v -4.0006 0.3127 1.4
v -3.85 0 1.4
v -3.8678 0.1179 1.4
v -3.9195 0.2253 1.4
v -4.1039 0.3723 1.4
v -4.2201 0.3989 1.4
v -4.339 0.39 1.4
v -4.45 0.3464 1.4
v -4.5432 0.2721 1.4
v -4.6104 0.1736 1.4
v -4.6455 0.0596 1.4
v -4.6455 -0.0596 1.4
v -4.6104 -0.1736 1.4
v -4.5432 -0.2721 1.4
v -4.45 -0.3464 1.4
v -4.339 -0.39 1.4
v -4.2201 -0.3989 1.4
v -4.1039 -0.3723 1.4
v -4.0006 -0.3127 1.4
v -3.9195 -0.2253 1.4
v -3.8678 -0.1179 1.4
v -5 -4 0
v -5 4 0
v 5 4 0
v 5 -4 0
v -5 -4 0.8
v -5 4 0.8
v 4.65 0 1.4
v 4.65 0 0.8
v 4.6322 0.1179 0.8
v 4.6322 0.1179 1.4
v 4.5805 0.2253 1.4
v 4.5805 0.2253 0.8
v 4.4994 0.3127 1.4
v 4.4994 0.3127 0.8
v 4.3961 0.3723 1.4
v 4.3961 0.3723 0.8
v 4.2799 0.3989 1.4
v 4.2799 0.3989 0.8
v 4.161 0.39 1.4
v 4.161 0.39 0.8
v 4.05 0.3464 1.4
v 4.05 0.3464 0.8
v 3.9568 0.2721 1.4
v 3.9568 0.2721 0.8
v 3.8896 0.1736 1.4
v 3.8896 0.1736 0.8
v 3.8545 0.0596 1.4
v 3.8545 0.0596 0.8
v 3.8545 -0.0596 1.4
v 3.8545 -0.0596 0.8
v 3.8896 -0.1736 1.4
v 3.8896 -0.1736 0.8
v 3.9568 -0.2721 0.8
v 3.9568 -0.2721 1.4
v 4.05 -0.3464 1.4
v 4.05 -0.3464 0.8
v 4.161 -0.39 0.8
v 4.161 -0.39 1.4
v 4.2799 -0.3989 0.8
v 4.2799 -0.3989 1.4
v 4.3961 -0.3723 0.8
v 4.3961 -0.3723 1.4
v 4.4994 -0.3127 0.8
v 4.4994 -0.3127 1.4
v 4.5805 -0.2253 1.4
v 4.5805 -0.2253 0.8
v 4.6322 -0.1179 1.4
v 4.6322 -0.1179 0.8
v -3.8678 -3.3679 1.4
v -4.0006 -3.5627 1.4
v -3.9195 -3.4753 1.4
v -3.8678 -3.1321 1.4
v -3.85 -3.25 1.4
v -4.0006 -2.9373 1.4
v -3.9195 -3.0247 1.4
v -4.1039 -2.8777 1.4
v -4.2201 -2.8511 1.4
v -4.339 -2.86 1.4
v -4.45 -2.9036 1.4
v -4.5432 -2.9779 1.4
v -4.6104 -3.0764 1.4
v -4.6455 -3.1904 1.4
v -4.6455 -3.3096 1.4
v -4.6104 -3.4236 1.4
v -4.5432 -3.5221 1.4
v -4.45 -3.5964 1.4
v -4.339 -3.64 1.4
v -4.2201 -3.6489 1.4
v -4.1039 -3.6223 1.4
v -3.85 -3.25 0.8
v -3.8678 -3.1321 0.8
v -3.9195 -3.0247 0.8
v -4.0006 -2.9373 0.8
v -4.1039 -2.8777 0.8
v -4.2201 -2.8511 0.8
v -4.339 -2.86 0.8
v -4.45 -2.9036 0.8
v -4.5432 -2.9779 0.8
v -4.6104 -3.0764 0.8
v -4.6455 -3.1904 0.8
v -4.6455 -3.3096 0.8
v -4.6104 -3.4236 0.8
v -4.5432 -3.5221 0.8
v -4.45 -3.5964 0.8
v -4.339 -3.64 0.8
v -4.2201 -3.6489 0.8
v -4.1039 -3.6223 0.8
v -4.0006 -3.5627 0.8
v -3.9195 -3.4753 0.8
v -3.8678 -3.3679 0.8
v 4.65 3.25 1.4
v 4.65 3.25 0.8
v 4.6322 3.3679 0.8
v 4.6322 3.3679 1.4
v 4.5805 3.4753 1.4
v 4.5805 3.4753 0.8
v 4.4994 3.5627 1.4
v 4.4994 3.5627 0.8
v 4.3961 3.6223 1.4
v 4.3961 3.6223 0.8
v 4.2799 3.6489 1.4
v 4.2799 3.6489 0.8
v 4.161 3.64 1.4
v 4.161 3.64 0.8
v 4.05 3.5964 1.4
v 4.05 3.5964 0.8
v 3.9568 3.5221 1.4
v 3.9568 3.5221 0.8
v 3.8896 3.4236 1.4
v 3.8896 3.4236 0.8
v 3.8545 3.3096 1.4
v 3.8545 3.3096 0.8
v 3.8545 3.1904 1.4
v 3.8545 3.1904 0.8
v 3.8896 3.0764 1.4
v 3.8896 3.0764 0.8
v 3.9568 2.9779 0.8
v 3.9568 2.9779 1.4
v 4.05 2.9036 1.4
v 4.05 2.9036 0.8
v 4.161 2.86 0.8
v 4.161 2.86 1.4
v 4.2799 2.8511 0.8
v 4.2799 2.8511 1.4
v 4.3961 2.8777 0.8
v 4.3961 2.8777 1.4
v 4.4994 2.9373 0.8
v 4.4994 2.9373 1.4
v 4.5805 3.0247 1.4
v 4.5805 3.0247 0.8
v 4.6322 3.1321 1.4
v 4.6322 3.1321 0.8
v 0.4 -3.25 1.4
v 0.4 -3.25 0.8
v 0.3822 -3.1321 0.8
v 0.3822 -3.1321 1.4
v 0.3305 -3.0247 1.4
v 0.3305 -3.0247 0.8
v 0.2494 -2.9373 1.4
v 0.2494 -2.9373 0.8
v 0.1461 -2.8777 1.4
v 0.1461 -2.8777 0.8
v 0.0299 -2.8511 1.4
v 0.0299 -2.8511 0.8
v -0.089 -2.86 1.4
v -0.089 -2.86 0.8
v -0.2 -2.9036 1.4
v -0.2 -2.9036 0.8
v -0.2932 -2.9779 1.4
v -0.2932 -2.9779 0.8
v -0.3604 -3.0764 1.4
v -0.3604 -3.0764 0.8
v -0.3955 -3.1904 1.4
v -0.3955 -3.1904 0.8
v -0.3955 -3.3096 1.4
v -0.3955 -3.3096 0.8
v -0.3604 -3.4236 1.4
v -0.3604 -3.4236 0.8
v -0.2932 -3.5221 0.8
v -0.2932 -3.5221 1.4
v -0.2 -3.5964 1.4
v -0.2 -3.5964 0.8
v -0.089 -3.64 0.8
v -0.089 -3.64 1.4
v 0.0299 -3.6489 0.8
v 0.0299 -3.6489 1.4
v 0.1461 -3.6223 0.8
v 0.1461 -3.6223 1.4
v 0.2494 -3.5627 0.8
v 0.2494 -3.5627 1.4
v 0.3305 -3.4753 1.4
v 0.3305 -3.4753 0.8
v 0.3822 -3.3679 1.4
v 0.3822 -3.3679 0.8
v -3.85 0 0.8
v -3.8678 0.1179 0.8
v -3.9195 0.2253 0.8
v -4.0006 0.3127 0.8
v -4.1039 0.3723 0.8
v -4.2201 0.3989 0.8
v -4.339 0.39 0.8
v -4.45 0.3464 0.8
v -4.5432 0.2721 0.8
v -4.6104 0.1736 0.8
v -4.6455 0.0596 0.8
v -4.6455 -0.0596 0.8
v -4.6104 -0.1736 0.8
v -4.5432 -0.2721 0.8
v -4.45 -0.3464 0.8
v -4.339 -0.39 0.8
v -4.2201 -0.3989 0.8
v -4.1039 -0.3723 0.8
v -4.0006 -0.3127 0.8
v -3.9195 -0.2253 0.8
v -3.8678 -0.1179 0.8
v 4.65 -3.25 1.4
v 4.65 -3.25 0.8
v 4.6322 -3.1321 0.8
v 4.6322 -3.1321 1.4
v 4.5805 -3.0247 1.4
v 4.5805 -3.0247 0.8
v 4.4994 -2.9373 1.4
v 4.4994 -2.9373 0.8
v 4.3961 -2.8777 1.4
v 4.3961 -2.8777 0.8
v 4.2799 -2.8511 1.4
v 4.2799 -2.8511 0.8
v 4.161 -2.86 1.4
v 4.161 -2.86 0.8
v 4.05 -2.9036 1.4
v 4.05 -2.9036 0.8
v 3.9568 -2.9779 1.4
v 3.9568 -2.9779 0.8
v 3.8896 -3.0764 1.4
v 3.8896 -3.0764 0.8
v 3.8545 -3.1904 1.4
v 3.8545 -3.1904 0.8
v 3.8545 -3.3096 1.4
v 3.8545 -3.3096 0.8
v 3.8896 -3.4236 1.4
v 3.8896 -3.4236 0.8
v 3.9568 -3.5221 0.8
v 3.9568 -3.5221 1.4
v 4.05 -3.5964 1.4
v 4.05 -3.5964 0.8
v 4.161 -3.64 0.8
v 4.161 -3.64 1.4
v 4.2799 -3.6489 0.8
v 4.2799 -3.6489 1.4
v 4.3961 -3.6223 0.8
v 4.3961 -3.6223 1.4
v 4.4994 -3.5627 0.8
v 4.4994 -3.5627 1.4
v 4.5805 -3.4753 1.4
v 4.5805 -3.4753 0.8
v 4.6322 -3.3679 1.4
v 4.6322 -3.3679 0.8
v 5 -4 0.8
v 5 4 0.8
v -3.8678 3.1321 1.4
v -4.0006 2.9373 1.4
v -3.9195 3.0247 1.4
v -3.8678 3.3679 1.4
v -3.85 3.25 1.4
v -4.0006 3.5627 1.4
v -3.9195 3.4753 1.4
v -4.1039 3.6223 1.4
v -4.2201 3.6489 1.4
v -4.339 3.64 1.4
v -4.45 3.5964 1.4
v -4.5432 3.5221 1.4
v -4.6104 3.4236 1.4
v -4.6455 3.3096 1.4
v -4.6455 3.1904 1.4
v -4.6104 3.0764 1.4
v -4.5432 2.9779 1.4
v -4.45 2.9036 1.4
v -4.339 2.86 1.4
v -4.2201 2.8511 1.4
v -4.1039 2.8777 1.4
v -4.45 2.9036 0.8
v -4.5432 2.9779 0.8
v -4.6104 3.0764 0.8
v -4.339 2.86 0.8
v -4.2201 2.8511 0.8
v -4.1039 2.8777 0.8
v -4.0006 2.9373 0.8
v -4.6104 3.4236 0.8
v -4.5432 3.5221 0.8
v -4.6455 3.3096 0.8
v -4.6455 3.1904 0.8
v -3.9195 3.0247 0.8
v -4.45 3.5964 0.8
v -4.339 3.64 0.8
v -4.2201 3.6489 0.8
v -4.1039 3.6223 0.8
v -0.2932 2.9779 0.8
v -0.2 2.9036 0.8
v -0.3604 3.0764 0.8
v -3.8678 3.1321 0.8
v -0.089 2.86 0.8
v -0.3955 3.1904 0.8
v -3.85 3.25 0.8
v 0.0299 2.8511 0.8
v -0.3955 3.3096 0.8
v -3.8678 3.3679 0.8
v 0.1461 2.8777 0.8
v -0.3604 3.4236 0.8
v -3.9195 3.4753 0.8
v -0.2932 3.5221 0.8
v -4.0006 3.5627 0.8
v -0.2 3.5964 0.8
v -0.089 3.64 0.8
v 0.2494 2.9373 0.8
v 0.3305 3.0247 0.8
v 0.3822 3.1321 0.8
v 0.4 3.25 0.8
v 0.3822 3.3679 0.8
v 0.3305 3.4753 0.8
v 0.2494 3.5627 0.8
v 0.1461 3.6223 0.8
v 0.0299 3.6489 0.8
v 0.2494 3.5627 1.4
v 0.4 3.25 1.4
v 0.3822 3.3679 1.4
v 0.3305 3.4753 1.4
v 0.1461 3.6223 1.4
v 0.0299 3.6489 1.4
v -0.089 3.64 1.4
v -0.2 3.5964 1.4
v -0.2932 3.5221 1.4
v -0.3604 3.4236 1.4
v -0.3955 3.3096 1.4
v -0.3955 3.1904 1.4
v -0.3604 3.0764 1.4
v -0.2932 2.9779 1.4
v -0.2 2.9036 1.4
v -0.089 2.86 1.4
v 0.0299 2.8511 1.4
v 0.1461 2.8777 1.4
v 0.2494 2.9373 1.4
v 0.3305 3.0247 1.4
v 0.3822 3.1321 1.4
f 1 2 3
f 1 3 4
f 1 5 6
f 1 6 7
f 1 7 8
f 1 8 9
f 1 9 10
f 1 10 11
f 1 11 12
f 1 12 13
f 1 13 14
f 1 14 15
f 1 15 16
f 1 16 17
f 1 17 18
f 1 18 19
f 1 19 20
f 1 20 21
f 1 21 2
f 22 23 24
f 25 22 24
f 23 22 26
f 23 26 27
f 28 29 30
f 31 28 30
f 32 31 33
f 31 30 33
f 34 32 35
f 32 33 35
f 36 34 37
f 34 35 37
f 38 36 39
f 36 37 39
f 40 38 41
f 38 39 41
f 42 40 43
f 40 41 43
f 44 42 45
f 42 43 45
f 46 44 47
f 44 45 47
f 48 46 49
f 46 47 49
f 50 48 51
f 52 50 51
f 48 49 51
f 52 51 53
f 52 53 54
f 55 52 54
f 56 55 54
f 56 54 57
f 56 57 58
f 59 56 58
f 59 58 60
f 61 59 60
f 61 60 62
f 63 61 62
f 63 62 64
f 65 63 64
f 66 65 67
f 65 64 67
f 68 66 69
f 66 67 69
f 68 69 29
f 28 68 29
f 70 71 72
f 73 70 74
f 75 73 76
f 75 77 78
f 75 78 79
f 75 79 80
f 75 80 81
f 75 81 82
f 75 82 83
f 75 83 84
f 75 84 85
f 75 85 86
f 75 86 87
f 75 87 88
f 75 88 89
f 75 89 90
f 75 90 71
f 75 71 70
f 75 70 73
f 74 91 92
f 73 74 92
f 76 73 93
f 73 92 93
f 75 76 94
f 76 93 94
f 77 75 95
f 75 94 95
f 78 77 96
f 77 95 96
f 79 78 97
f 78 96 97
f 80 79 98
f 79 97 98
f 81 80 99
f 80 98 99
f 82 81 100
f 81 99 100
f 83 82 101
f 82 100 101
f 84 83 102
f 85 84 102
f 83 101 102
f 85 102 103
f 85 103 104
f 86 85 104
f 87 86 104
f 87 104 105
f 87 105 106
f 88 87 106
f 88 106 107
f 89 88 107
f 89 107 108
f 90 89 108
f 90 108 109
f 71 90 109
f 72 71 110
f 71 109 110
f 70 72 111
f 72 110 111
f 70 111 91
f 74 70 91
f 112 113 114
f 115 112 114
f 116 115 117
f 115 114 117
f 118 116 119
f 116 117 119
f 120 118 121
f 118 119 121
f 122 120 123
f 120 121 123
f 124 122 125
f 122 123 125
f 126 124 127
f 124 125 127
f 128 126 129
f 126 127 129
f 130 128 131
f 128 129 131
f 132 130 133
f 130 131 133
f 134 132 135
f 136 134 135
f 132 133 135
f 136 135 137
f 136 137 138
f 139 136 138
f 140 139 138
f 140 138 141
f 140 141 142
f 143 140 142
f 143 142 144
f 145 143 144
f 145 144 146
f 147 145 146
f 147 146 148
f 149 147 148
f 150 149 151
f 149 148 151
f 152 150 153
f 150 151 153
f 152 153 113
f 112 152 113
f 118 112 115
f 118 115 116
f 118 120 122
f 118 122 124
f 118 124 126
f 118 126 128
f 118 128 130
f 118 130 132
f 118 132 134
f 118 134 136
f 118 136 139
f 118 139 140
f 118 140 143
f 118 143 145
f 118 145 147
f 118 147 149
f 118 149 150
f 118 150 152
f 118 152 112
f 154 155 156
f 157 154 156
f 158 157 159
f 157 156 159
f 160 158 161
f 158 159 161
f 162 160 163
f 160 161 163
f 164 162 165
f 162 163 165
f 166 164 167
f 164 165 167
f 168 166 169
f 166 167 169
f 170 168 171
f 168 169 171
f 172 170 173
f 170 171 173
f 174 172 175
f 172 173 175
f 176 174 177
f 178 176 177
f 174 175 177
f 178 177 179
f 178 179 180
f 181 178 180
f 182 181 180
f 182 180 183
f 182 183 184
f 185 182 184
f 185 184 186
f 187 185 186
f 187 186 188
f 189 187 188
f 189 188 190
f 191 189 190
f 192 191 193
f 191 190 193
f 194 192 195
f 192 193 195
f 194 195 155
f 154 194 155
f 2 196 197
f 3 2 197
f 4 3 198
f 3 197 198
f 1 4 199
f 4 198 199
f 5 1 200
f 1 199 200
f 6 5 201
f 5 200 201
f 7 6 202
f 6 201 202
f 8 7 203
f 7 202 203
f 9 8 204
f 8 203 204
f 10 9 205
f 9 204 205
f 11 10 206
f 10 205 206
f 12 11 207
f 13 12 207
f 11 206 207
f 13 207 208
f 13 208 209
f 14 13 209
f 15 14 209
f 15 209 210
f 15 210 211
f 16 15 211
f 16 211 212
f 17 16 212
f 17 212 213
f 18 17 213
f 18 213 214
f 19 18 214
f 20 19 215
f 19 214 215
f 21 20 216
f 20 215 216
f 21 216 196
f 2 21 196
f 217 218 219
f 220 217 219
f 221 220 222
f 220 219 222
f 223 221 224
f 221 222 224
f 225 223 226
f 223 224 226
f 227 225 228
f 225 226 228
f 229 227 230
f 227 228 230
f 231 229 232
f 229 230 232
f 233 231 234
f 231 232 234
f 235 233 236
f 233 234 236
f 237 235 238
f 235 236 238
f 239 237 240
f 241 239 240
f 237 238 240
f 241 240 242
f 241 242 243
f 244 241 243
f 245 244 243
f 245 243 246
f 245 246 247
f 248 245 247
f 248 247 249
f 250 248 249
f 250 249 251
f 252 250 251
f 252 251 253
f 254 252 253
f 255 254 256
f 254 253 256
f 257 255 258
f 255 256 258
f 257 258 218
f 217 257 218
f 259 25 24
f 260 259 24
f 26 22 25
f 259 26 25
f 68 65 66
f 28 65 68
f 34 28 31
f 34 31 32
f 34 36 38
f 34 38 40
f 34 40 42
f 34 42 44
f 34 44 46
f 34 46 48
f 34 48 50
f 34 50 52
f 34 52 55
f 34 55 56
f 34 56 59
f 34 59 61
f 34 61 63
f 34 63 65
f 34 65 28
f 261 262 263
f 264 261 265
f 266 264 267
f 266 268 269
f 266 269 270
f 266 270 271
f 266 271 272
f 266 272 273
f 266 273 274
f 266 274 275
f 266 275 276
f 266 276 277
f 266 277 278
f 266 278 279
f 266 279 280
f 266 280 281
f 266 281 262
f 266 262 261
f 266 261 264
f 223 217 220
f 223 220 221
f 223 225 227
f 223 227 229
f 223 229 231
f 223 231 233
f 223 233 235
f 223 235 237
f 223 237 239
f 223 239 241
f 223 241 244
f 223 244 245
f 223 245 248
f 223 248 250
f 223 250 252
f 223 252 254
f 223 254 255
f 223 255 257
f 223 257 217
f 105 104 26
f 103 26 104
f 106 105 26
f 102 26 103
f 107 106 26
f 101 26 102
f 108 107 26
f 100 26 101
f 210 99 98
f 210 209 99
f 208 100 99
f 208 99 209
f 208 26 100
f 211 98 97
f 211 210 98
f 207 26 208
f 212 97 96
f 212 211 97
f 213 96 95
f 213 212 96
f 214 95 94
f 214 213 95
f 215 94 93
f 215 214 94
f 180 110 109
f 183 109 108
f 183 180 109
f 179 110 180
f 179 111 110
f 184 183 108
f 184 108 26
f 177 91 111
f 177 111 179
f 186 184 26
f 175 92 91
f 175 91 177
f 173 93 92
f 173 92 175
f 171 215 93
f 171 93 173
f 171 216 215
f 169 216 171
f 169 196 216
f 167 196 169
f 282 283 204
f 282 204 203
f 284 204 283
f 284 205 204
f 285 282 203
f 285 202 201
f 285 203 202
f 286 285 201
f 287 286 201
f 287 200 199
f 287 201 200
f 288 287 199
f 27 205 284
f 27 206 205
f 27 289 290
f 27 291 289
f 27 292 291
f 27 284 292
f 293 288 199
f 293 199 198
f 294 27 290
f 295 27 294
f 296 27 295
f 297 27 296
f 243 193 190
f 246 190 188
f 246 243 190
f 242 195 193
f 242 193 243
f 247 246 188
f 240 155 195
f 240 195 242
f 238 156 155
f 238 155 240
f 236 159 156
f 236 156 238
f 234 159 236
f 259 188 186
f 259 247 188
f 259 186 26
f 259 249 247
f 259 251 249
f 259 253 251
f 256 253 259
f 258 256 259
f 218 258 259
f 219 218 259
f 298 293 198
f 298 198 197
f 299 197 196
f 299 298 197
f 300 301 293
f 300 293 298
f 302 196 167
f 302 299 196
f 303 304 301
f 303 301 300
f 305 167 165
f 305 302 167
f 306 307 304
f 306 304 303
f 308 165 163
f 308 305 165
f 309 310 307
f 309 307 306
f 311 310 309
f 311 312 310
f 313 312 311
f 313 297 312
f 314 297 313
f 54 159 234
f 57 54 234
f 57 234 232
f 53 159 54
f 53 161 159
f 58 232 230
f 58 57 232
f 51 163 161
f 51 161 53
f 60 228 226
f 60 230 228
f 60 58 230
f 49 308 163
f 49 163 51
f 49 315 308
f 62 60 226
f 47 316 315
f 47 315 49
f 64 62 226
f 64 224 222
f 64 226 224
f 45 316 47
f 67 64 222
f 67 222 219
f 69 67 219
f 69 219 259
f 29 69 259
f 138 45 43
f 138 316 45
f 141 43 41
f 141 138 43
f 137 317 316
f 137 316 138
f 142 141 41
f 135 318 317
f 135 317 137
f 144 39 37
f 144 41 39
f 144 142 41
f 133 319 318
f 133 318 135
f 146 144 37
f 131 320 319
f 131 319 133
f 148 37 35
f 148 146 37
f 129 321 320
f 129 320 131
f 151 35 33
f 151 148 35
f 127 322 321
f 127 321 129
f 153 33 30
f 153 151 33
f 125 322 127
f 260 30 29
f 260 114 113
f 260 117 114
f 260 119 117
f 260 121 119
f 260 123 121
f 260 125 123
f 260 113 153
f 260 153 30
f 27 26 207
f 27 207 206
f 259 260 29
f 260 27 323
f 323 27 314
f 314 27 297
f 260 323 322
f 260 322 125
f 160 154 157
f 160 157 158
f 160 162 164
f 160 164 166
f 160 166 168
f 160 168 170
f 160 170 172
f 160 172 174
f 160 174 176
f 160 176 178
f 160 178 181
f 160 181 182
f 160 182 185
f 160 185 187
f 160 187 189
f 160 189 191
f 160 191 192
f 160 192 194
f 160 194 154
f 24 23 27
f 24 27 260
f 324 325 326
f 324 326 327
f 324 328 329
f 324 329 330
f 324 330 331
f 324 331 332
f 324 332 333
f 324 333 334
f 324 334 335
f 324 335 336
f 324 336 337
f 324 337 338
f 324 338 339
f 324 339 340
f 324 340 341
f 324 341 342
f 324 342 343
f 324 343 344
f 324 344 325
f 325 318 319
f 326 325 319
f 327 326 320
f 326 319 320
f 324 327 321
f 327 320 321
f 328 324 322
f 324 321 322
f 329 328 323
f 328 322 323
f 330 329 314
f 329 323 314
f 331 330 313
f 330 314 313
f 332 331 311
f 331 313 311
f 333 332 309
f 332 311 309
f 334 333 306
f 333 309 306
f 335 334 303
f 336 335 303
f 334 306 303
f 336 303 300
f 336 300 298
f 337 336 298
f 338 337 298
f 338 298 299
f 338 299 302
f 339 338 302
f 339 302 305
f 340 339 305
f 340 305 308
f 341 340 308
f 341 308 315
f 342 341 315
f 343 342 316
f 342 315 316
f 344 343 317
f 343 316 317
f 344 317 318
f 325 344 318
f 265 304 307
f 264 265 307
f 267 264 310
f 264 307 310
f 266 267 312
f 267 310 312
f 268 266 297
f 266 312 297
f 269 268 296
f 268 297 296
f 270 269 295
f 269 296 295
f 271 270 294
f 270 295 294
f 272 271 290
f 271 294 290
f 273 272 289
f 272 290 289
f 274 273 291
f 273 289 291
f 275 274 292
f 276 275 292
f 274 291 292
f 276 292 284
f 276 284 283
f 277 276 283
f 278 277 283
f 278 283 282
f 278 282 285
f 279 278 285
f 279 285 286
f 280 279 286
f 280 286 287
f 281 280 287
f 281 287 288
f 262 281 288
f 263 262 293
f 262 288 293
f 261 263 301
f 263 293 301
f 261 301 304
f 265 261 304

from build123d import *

# Parameters (mm, degrees)
F0_W     = 10
F0_H     = 8
F1_DEPTH = 0.8
F2_R     = 0.4
F3_DEPTH = 0.6


with BuildPart() as f1:
    # F0 (on Top) → F1 (new body)
    with BuildSketch(Plane.XY):
        Rectangle(F0_W, F0_H)
    extrude(amount=F1_DEPTH)

    # F2 (on face) → F3 (join)
    with BuildSketch(Plane.XY.offset(0.8)):
        with Locations((-4.25, 3.25)):
            Circle(F2_R)
        with Locations((-4.25, 0)):
            Circle(F2_R)
        with Locations((-4.25, -3.25)):
            Circle(F2_R)
        with Locations((0, 3.25)):
            Circle(F2_R)
        with Locations((4.25, 3.25)):
            Circle(F2_R)
        with Locations((4.25, 0)):
            Circle(F2_R)
        with Locations((4.25, -3.25)):
            Circle(F2_R)
        with Locations((0, -3.25)):
            Circle(F2_R)
    extrude(amount=F3_DEPTH)


solid = f1.part
